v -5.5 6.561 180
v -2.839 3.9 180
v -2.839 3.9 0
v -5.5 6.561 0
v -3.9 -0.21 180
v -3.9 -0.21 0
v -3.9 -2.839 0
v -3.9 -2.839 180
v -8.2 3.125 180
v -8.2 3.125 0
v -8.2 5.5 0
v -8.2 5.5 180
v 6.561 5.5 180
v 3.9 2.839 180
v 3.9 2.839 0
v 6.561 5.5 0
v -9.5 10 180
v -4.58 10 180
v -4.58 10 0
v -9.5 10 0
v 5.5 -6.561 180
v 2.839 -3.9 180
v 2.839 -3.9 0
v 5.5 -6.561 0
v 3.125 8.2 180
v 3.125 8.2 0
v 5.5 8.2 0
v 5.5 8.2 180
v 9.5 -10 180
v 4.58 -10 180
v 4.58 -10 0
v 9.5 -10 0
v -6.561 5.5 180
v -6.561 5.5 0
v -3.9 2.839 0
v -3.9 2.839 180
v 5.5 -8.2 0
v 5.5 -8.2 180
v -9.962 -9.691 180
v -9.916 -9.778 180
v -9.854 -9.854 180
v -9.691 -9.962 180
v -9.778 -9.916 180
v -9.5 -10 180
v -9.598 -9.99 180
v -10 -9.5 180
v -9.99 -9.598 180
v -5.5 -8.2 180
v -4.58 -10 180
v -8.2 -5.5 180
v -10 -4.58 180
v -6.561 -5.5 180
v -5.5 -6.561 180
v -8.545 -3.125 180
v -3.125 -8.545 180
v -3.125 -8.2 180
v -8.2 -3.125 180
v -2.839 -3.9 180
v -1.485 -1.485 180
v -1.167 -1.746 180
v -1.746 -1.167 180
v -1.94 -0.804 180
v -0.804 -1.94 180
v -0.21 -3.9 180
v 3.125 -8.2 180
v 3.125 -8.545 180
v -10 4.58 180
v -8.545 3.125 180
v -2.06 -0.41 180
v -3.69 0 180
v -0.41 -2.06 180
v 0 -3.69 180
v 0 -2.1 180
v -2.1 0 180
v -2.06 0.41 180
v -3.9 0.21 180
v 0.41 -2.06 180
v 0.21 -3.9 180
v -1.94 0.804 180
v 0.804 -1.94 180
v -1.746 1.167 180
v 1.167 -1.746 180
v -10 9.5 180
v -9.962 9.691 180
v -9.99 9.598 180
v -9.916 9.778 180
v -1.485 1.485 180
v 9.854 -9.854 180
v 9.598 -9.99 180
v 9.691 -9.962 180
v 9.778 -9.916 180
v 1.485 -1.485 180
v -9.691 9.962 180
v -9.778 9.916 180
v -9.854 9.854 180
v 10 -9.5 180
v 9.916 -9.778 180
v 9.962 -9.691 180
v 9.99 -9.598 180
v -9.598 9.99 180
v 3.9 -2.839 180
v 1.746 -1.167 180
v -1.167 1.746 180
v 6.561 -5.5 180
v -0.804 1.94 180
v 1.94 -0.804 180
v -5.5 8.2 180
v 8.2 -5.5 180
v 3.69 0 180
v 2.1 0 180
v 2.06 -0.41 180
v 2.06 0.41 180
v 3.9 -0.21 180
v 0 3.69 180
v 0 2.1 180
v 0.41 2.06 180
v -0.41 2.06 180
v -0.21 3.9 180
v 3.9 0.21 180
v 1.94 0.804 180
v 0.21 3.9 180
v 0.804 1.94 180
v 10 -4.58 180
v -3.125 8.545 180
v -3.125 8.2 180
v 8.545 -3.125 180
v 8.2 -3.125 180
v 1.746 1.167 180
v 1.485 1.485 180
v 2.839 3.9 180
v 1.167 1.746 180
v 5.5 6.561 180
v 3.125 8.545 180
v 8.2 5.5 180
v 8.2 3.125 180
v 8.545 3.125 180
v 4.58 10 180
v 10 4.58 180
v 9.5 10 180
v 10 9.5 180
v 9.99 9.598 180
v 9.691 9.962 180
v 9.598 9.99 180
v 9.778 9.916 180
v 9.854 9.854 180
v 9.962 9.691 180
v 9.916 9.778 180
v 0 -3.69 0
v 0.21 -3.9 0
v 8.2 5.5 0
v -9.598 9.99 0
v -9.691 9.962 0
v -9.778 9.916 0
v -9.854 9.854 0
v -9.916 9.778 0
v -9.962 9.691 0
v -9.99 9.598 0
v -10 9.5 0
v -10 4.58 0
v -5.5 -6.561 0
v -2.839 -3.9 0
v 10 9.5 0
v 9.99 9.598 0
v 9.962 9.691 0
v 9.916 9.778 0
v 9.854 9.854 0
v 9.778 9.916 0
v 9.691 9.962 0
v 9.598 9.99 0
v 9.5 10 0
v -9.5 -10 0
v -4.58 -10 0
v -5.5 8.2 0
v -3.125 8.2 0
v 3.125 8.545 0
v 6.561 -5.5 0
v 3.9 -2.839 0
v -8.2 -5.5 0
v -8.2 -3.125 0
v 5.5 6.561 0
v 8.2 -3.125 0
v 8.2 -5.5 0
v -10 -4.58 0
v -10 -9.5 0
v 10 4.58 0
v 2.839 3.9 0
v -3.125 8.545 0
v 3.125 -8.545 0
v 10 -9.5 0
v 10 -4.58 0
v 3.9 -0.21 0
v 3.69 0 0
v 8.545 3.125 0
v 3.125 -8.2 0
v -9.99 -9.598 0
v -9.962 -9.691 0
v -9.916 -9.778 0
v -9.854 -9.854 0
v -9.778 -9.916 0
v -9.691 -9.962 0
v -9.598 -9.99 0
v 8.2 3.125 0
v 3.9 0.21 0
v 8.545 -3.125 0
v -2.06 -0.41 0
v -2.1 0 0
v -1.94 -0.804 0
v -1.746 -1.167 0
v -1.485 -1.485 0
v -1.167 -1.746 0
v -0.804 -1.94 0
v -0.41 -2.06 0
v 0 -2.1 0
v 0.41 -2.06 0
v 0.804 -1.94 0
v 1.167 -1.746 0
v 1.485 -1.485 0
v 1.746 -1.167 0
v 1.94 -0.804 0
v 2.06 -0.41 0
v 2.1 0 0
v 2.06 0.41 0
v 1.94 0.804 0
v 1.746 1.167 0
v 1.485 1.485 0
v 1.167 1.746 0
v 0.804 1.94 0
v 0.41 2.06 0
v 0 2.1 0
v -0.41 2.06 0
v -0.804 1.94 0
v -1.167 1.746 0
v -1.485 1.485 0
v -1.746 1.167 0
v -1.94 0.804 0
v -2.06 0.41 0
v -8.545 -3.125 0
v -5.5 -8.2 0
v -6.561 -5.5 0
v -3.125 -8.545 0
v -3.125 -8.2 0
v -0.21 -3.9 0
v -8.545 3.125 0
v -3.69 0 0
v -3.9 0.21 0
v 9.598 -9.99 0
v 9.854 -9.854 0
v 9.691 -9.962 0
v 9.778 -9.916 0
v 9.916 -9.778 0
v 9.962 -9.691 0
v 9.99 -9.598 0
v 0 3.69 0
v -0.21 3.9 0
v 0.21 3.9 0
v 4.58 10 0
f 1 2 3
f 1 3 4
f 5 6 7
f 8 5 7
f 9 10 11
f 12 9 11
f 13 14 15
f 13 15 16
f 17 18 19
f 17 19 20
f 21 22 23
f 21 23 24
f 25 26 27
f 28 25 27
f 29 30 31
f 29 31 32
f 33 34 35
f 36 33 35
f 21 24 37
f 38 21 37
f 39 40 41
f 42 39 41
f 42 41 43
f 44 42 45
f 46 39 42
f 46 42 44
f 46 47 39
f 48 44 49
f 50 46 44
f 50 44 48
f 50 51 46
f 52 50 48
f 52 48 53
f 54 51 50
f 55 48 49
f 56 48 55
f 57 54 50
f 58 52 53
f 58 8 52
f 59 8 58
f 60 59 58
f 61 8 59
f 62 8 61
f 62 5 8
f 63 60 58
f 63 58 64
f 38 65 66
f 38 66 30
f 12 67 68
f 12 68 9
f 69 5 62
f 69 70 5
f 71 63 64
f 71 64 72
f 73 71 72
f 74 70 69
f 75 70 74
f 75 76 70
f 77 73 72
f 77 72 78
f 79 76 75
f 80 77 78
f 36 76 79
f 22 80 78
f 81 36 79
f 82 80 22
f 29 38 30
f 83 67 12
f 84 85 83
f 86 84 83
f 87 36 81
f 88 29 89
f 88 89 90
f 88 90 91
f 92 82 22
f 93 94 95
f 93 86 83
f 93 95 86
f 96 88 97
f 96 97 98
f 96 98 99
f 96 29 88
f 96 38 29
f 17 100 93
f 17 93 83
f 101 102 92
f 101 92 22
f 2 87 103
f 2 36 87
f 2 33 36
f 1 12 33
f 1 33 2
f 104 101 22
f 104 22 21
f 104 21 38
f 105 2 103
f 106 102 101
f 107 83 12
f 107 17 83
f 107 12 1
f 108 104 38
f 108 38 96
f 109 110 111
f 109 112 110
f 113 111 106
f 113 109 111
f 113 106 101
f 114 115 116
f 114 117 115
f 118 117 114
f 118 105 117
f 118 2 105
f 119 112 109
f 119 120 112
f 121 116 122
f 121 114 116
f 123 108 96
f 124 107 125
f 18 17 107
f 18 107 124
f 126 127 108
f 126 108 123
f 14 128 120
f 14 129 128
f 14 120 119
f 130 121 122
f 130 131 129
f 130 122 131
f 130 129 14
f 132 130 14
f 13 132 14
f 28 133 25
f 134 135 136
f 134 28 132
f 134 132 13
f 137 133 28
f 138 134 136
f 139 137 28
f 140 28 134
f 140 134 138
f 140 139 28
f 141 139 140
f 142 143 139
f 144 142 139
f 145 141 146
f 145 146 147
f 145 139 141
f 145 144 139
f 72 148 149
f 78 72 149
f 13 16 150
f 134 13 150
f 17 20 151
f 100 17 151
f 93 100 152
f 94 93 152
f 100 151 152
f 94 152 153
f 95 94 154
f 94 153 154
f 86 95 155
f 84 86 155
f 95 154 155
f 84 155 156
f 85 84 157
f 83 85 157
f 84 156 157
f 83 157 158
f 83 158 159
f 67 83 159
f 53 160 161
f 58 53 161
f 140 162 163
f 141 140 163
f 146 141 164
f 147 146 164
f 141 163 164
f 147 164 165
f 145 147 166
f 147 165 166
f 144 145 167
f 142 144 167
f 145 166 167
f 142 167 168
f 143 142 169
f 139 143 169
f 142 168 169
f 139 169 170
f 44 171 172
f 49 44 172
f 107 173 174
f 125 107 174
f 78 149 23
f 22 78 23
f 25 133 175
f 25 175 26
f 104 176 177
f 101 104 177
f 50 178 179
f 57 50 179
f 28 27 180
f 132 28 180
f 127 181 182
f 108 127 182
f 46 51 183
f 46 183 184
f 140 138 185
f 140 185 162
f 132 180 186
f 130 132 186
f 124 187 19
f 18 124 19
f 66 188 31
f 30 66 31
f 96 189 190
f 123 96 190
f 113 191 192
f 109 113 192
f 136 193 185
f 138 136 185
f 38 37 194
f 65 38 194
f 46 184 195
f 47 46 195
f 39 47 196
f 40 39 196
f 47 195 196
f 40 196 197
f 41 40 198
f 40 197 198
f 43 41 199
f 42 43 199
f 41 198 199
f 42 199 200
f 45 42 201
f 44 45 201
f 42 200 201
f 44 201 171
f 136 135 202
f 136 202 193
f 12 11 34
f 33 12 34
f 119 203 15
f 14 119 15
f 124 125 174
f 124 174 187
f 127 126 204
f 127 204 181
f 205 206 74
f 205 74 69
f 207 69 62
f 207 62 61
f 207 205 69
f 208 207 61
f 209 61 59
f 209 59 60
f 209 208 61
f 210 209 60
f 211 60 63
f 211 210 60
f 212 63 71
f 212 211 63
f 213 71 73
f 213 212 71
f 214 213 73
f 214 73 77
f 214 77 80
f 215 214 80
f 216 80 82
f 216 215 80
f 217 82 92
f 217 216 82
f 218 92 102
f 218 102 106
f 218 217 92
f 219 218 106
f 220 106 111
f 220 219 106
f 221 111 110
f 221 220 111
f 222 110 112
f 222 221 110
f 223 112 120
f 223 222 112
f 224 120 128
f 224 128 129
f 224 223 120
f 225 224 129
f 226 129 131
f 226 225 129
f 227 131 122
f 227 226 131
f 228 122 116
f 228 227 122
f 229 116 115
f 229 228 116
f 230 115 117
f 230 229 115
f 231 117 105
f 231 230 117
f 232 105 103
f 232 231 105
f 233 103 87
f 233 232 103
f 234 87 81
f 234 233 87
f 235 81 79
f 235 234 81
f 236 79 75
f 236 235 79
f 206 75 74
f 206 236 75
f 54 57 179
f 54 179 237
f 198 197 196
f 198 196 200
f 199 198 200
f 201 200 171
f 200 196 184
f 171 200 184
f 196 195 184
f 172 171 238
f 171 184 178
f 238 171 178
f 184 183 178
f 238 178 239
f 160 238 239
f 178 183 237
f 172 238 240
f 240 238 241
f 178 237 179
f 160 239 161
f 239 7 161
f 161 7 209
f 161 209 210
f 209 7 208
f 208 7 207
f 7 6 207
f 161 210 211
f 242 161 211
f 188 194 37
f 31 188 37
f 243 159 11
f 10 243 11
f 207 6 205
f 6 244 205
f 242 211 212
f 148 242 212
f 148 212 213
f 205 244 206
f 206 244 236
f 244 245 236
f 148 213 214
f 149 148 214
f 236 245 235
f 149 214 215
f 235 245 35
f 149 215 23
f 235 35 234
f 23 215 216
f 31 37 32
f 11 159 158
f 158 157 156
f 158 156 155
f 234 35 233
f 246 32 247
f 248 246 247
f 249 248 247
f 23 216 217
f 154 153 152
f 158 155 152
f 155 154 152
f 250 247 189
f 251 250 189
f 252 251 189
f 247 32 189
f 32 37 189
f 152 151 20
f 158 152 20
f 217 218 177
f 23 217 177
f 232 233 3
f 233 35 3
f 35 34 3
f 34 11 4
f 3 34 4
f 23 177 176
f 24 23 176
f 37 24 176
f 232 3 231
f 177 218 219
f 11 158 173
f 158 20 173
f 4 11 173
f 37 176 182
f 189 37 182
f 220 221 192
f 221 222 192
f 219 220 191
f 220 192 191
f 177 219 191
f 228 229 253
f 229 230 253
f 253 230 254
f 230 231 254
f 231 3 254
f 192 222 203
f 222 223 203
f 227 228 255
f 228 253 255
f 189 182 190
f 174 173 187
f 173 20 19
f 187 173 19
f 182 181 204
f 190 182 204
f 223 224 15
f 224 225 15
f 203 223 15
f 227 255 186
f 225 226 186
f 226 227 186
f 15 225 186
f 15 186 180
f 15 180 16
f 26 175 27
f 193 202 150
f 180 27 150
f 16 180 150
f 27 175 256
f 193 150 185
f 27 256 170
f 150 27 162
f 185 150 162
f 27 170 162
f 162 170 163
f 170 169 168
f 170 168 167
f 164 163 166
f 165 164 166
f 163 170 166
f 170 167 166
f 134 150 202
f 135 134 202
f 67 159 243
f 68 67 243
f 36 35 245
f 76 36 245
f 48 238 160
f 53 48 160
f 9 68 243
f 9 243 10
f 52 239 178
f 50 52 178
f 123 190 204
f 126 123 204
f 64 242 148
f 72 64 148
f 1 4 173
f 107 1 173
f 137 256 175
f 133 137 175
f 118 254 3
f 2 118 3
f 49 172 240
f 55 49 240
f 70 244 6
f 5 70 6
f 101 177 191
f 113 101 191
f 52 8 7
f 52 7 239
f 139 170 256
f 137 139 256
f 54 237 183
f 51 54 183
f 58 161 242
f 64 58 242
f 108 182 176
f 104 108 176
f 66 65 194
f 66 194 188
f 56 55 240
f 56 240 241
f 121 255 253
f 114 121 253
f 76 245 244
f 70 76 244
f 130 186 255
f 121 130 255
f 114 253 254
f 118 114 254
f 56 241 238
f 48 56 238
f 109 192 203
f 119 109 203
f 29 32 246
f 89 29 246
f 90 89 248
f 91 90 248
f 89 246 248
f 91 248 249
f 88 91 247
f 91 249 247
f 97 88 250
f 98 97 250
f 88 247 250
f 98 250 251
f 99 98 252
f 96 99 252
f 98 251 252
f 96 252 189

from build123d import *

# Parameters (mm, degrees)
SKETCH1_R           = 2.1
BOSS_EXTRUDE1_DEPTH = 180


with BuildPart() as part:
    # Sketch1 → Boss-Extrude1 (new body)
    with BuildSketch(Plane.XY):
        with BuildLine():
            Line((4.58, -10), (9.5, -10))
            ThreePointArc((9.5, -10), (9.853553391, -9.853553391), (10, -9.5))
            Line((10, -9.5), (10, -4.58))
            Line((10, -4.58), (8.545, -3.125))
            Line((8.545, -3.125), (8.2, -3.125))
            Line((8.2, -3.125), (8.2, -5.5))
            Line((8.2, -5.5), (6.560660172, -5.5))
            Line((6.560660172, -5.5), (3.9, -2.839339828))
            Line((3.9, -2.839339828), (3.9, -0.21))
            Line((3.9, -0.21), (3.69, 0))
            Line((3.69, 0), (3.9, 0.21))
            Line((3.9, 0.21), (3.9, 2.839339828))
            Line((3.9, 2.839339828), (6.560660172, 5.5))
            Line((6.560660172, 5.5), (8.2, 5.5))
            Line((8.2, 5.5), (8.2, 3.125))
            Line((8.2, 3.125), (8.545, 3.125))
            Line((8.545, 3.125), (10, 4.58))
            Line((10, 4.58), (10, 9.5))
            ThreePointArc((10, 9.5), (9.853553391, 9.853553391), (9.5, 10))
            Line((9.5, 10), (4.58, 10))
            Line((4.58, 10), (3.125, 8.545))
            Line((3.125, 8.545), (3.125, 8.2))
            Line((3.125, 8.2), (5.5, 8.2))
            Line((5.5, 8.2), (5.5, 6.560660172))
            Line((5.5, 6.560660172), (2.839339828, 3.9))
            Line((2.839339828, 3.9), (0.21, 3.9))
            Line((0.21, 3.9), (0, 3.69))
            Line((0, 3.69), (-0.21, 3.9))
            Line((-0.21, 3.9), (-2.839339828, 3.9))
            Line((-2.839339828, 3.9), (-5.5, 6.560660172))
            Line((-5.5, 6.560660172), (-5.5, 8.2))
            Line((-5.5, 8.2), (-3.125, 8.2))
            Line((-3.125, 8.2), (-3.125, 8.545))
            Line((-3.125, 8.545), (-4.58, 10))
            Line((-4.58, 10), (-9.5, 10))
            ThreePointArc((-9.5, 10), (-9.853553391, 9.853553391), (-10, 9.5))
            Line((-10, 9.5), (-10, 4.58))
            Line((-10, 4.58), (-8.545, 3.125))
            Line((-8.545, 3.125), (-8.2, 3.125))
            Line((-8.2, 3.125), (-8.2, 5.5))
            Line((-8.2, 5.5), (-6.560660172, 5.5))
            Line((-6.560660172, 5.5), (-3.9, 2.839339828))
            Line((-3.9, 2.839339828), (-3.9, 0.21))
            Line((-3.9, 0.21), (-3.69, 0))
            Line((-3.69, 0), (-3.9, -0.21))
            Line((-3.9, -0.21), (-3.9, -2.839339828))
            Line((-3.9, -2.839339828), (-6.560660172, -5.5))
            Line((-6.560660172, -5.5), (-8.2, -5.5))
            Line((-8.2, -5.5), (-8.2, -3.125))
            Line((-8.2, -3.125), (-8.545, -3.125))
            Line((-8.545, -3.125), (-10, -4.58))
            Line((-10, -4.58), (-10, -9.5))
            ThreePointArc((-10, -9.5), (-9.853553391, -9.853553391), (-9.5, -10))
            Line((-9.5, -10), (-4.58, -10))
            Line((-4.58, -10), (-3.125, -8.545))
            Line((-3.125, -8.545), (-3.125, -8.2))
            Line((-3.125, -8.2), (-5.5, -8.2))
            Line((-5.5, -8.2), (-5.5, -6.560660172))
            Line((-5.5, -6.560660172), (-2.839339828, -3.9))
            Line((-2.839339828, -3.9), (-0.21, -3.9))
            Line((-0.21, -3.9), (0, -3.69))
            Line((0, -3.69), (0.21, -3.9))
            Line((0.21, -3.9), (2.839339828, -3.9))
            Line((2.839339828, -3.9), (5.5, -6.560660172))
            Line((5.5, -6.560660172), (5.5, -8.2))
            Line((5.5, -8.2), (3.125, -8.2))
            Line((3.125, -8.2), (3.125, -8.545))
            Line((3.125, -8.545), (4.58, -10))
        make_face()
        with Locations(Location((0, 0, 0), (0, 0, 180))):
            Circle(SKETCH1_R, mode=Mode.SUBTRACT)
    extrude(amount=BOSS_EXTRUDE1_DEPTH)


solid = part.part
